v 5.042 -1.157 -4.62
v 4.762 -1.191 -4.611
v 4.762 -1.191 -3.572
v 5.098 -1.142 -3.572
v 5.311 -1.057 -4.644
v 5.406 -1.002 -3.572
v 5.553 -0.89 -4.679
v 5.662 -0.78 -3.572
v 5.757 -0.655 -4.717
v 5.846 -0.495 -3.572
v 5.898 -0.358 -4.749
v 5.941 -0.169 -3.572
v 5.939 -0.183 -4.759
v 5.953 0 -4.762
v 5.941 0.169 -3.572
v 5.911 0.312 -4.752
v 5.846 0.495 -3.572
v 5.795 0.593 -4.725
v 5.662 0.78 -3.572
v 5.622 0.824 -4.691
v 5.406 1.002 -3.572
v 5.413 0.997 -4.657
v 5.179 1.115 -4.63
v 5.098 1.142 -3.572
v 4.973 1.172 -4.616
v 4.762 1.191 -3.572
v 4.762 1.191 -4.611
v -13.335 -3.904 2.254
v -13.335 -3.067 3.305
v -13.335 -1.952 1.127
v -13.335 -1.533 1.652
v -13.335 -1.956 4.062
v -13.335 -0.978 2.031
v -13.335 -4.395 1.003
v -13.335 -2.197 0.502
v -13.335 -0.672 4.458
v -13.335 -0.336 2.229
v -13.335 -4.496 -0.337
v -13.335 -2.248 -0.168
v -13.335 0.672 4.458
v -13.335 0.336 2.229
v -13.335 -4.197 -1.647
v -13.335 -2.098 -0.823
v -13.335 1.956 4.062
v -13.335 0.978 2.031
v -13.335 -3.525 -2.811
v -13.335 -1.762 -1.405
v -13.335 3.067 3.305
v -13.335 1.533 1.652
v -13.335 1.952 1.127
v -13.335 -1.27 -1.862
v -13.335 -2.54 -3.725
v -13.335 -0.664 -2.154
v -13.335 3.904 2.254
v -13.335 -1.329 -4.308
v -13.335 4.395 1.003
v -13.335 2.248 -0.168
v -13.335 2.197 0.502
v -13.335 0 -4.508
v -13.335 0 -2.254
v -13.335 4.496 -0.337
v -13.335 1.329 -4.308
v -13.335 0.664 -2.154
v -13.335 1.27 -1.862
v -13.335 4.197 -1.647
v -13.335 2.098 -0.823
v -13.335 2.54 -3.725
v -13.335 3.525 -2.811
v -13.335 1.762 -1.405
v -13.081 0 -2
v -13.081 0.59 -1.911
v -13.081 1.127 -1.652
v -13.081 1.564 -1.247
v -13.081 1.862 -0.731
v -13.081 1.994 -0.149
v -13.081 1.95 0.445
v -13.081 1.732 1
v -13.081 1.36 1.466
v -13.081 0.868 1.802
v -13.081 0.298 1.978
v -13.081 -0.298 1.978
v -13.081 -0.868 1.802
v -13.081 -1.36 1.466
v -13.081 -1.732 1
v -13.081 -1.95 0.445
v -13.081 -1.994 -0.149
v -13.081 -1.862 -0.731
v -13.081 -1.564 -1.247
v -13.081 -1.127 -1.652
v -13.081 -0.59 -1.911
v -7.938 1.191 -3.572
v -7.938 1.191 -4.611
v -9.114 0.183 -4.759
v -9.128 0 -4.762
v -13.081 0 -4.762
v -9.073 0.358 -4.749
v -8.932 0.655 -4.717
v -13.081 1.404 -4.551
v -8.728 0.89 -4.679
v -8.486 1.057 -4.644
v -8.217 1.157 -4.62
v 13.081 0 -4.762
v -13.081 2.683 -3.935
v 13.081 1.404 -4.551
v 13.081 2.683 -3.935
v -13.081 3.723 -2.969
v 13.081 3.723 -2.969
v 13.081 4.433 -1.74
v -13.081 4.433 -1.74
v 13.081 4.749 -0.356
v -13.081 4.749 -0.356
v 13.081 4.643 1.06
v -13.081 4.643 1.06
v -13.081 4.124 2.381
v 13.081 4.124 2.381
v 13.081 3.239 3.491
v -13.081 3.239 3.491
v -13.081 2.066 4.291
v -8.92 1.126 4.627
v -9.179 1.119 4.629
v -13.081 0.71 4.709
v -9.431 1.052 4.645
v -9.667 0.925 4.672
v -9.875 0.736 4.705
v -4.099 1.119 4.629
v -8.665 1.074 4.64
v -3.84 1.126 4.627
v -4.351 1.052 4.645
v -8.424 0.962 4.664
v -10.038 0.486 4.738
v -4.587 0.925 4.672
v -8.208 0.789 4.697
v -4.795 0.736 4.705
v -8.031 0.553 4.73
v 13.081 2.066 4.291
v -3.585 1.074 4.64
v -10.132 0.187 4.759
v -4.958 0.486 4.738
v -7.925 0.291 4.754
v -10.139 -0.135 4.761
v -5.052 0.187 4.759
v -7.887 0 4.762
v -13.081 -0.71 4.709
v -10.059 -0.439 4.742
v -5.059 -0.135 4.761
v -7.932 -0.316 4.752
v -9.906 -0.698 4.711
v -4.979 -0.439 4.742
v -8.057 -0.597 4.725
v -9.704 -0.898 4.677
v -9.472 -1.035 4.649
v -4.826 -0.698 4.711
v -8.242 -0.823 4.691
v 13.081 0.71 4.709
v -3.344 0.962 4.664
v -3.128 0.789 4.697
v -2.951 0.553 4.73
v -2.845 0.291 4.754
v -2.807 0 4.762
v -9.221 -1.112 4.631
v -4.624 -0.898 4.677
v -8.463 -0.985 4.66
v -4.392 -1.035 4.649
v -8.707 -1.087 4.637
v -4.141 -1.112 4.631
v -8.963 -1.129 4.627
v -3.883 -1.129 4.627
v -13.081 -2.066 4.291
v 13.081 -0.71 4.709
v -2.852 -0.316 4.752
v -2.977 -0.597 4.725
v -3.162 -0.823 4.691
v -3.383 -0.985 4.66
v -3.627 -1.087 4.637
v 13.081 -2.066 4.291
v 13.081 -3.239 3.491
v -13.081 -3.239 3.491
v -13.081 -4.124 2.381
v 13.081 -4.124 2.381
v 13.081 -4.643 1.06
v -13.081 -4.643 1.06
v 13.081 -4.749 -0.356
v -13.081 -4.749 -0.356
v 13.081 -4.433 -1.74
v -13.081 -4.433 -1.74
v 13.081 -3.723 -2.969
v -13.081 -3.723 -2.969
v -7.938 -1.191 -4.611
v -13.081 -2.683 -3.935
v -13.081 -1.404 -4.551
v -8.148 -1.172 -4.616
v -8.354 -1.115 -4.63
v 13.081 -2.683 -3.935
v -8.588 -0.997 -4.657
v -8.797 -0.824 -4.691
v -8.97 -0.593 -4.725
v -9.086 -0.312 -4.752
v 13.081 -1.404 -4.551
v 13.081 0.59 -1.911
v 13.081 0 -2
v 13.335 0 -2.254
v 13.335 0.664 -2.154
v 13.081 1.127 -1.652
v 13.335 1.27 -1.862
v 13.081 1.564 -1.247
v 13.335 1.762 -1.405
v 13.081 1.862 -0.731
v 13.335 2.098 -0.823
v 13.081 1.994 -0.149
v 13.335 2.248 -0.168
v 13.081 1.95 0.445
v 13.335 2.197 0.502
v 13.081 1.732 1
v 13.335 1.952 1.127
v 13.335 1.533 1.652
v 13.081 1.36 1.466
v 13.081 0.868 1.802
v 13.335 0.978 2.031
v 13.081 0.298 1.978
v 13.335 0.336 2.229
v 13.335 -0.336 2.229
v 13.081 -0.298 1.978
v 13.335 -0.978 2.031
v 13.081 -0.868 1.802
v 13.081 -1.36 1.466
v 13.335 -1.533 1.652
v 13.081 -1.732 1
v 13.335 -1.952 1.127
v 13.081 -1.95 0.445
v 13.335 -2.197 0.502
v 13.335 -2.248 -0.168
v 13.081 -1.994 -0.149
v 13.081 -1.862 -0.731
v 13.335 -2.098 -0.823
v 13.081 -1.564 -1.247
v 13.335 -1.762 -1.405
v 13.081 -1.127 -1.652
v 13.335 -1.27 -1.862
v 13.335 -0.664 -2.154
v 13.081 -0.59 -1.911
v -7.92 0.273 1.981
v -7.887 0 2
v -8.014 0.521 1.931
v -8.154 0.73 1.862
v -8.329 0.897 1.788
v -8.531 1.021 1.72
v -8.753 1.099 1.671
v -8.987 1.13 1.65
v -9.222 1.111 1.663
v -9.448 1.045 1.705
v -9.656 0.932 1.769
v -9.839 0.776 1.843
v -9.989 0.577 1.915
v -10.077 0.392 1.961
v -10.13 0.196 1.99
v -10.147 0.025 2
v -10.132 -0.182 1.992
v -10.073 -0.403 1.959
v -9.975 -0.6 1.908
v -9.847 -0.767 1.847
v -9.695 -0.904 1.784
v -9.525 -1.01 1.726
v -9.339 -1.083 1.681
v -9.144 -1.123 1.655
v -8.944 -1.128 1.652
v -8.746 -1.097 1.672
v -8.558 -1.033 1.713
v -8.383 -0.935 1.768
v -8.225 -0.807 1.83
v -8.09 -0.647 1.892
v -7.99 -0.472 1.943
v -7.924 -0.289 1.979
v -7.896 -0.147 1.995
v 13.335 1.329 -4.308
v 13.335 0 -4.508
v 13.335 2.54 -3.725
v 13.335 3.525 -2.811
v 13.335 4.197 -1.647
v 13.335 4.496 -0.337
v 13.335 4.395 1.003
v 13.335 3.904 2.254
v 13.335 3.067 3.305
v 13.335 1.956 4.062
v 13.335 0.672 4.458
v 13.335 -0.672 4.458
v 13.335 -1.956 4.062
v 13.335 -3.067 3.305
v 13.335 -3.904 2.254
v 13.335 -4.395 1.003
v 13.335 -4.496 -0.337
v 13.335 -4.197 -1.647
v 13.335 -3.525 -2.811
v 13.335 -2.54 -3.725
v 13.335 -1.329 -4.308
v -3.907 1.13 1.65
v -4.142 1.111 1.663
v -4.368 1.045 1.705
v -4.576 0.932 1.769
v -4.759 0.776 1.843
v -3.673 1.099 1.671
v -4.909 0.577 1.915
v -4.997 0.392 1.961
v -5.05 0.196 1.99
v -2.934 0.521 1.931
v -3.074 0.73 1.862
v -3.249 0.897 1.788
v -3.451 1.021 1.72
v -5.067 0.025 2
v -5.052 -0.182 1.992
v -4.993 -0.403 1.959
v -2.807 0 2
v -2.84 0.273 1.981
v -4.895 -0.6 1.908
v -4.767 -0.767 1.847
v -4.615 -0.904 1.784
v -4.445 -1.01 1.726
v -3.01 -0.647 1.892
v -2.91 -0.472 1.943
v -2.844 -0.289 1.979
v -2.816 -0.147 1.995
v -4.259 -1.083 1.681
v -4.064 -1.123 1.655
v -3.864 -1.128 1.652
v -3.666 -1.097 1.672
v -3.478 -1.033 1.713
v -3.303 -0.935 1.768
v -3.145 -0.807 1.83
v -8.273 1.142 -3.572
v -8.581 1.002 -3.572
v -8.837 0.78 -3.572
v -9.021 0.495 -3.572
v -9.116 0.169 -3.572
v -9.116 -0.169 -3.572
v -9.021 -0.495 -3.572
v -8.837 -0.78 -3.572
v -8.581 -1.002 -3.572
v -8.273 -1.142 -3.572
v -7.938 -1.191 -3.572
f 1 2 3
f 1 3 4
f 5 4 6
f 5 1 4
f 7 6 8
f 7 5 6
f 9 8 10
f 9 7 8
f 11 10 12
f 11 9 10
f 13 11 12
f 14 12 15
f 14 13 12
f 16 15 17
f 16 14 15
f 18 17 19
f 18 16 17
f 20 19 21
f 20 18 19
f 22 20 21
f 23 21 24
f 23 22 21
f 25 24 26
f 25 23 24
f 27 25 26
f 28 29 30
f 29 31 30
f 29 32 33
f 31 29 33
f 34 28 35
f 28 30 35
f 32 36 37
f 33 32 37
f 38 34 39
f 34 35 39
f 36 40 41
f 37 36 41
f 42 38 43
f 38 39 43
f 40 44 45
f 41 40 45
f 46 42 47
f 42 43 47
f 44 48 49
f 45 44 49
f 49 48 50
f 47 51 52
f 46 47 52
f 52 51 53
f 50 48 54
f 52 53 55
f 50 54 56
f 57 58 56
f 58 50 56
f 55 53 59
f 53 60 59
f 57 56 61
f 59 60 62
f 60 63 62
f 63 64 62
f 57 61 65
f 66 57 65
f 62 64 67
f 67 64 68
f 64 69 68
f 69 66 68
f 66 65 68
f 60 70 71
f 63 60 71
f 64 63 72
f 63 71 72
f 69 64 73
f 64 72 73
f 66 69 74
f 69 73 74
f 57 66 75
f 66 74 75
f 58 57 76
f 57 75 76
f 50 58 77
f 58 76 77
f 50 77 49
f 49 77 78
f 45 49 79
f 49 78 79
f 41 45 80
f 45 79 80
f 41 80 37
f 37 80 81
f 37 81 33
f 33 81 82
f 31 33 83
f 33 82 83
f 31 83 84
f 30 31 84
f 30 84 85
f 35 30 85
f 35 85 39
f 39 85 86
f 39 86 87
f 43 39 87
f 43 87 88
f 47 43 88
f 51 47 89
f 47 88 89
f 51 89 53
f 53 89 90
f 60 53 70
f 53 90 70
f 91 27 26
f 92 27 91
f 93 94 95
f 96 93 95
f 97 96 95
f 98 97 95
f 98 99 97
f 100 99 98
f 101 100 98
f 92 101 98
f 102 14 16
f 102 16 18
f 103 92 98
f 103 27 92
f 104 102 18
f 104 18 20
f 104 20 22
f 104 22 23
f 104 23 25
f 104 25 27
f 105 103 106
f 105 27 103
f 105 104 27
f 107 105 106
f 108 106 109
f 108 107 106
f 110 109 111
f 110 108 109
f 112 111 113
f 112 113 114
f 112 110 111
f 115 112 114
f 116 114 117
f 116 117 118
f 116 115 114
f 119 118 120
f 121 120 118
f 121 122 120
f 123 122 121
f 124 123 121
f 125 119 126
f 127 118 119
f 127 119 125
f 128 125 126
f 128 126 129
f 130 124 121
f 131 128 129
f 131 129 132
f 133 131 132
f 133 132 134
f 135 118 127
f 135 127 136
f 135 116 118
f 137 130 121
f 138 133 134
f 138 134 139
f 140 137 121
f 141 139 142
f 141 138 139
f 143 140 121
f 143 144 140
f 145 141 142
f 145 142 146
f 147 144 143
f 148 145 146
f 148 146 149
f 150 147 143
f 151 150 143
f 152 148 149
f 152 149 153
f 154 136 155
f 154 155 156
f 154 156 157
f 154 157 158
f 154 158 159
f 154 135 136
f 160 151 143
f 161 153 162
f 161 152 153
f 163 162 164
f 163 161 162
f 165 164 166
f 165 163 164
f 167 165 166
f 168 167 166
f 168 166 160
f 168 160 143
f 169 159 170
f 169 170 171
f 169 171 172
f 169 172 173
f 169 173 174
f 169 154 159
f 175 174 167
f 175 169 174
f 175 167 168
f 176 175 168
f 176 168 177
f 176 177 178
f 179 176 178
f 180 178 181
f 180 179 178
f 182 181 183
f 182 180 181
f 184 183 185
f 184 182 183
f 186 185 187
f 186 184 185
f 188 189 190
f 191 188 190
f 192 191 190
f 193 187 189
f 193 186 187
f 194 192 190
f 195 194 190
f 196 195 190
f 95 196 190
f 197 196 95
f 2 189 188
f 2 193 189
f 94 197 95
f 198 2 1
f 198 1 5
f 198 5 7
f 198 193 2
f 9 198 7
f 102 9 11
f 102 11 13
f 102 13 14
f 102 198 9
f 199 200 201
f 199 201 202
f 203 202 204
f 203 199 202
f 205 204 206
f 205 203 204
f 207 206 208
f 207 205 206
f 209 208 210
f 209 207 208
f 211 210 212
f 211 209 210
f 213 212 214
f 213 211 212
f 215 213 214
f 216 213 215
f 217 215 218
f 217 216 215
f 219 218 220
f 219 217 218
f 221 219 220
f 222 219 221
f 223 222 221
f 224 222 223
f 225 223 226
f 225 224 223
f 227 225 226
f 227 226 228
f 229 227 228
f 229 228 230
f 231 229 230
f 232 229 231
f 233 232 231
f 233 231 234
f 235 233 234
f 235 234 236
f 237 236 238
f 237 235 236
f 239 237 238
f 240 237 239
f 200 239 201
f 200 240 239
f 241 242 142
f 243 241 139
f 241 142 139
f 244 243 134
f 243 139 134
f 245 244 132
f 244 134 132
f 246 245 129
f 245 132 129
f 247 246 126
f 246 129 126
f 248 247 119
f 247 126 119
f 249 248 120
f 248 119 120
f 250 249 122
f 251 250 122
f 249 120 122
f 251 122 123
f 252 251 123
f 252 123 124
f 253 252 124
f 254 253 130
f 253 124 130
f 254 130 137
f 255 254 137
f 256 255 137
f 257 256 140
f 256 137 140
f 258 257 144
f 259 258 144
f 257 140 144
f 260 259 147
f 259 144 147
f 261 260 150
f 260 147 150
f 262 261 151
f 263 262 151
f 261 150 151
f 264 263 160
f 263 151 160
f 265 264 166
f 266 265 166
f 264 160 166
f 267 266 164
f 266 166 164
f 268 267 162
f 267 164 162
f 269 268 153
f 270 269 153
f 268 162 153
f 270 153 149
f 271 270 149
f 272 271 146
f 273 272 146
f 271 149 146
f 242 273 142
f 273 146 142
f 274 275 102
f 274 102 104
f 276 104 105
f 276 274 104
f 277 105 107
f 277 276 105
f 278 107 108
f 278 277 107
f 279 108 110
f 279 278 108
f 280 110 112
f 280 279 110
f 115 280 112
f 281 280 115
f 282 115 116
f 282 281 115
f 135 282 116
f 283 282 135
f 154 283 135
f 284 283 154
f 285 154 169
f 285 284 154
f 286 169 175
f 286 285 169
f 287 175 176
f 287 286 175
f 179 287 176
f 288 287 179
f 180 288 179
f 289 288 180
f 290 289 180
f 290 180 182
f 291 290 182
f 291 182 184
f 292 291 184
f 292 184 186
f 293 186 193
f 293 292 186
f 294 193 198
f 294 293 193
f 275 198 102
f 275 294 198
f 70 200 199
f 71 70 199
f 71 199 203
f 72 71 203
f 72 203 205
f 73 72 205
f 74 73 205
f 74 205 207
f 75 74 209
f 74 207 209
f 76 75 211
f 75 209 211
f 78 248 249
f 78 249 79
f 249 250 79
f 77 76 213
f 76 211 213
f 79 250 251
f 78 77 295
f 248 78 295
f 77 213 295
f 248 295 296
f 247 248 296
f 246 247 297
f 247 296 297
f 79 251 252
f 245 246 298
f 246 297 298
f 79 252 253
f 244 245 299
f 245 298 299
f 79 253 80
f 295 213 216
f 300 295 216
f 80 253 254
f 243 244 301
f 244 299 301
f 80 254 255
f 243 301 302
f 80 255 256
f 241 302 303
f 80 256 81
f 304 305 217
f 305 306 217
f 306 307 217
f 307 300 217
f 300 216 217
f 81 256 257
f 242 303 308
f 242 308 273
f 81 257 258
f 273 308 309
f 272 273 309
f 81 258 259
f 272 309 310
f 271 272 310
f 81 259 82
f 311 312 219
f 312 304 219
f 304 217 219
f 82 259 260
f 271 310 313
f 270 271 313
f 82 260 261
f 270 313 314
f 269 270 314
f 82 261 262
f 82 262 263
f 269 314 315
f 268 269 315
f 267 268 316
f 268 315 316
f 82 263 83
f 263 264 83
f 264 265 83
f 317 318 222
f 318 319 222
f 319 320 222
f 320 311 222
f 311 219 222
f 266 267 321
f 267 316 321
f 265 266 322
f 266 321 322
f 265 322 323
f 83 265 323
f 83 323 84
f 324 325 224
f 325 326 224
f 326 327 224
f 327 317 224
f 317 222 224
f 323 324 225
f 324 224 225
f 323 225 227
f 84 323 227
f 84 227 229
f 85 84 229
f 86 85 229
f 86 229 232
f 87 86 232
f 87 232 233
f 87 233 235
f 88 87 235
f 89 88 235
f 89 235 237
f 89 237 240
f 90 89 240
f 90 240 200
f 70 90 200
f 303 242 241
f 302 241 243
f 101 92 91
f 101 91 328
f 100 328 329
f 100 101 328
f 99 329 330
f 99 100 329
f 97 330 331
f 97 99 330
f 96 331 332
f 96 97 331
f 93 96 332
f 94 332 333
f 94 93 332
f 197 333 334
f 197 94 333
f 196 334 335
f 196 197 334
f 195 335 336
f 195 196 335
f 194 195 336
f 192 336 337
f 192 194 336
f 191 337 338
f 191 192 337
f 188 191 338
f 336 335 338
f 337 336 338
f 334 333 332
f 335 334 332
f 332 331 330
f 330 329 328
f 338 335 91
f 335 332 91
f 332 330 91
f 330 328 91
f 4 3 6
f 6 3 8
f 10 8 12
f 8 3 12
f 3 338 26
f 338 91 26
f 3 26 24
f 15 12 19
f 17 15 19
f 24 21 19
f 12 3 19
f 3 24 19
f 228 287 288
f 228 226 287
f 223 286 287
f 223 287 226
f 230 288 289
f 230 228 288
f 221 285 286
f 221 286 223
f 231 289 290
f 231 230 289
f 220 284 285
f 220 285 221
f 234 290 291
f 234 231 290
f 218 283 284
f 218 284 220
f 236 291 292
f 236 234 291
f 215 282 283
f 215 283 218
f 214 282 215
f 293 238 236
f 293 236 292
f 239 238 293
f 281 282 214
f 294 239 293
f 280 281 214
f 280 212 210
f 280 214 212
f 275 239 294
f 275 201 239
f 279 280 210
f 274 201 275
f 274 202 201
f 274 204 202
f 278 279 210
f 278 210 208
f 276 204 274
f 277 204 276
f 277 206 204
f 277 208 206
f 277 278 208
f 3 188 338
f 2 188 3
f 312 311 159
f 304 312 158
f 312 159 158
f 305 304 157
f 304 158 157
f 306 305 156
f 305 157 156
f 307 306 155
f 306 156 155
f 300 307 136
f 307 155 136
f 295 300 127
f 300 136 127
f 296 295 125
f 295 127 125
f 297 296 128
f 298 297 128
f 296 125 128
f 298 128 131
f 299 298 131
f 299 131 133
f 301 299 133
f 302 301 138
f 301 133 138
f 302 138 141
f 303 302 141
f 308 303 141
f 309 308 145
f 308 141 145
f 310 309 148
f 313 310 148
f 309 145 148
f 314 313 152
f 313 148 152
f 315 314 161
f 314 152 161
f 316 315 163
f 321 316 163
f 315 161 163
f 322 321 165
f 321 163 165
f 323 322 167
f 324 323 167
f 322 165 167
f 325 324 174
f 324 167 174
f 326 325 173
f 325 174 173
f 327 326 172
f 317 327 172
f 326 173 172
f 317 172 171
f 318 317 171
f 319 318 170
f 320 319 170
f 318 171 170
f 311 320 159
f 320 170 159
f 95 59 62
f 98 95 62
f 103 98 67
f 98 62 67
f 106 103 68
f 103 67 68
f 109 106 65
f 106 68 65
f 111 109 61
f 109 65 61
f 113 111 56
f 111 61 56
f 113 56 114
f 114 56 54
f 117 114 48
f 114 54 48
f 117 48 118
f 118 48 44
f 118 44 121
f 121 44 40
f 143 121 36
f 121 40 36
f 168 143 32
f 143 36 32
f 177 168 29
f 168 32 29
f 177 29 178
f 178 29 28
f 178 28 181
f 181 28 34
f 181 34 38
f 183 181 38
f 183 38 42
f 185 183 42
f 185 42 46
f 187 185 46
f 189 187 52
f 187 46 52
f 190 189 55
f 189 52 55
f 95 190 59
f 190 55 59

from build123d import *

# Parameters (mm, degrees)
SKETCH1_R                  = 4.7625
BOSS_EXTRUDE1_DEPTH        = 13.335
SKETCH2_R                  = 2
CUT_EXTRUDE1_DEPTH         = 28.507302894
F_4_40_TAPPED_HOLE1_REACH  = 19.065
F_4_40_TAPPED_HOLE1_BORE_R = 1.1303
CUT_EXTRUDE2_DEPTH         = 1.190625
CHAMFER1_SIZE              = 0.254


with BuildPart() as part:
    # Sketch1 → Boss-Extrude1 (new, symmetric)
    with BuildSketch(Plane(origin=(0, 0, 0), x_dir=(0, 0, -1), z_dir=(1, 0, 0))):
        Circle(SKETCH1_R)
    extrude(amount=BOSS_EXTRUDE1_DEPTH, both=True)

    # Sketch2 → Cut-Extrude1 (cut, through all)
    with BuildSketch(Plane(origin=(13.335, 0, 0), x_dir=(0, 0, -1), z_dir=(1, 0, 0))):
        Circle(SKETCH2_R)
    extrude(amount=-CUT_EXTRUDE1_DEPTH, mode=Mode.SUBTRACT)

    # #4-40 Tapped Hole1 bore → #4-40 Tapped Hole1 (cut, up to next)
    with BuildSketch(Plane.XY.offset(4.7625), mode=Mode.PRIVATE) as f_4_40_tapped_hole1_sk1:
        with Locations((-9.017, 0)):
            Circle(F_4_40_TAPPED_HOLE1_BORE_R)
    f_4_40_tapped_hole1_tool1 = extrude(f_4_40_tapped_hole1_sk1.sketch, amount=-F_4_40_TAPPED_HOLE1_REACH, mode=Mode.PRIVATE) & part.part
    # #4-40 Tapped Hole1 bore → #4-40 Tapped Hole1 (cut, up to next)
    with BuildSketch(Plane.XY.offset(4.7625), mode=Mode.PRIVATE) as f_4_40_tapped_hole1_sk2:
        with Locations((-3.937, 0)):
            Circle(F_4_40_TAPPED_HOLE1_BORE_R)
    f_4_40_tapped_hole1_tool2 = extrude(f_4_40_tapped_hole1_sk2.sketch, amount=-F_4_40_TAPPED_HOLE1_REACH, mode=Mode.PRIVATE) & part.part
    add(f_4_40_tapped_hole1_tool1.solids().sort_by_distance((-9.017, 0, 4.7625))[0], mode=Mode.SUBTRACT)
    add(f_4_40_tapped_hole1_tool2.solids().sort_by_distance((-3.937, 0, 4.7625))[0], mode=Mode.SUBTRACT)

    # Sketch7 → Cut-Extrude2 (cut)
    with BuildSketch(Plane(origin=(0, 0, -4.7625), x_dir=(-1, 0, 0), z_dir=(0, 0, -1))):
        with BuildLine():
            Line((-4.7625, 1.190625), (7.9375, 1.190625))
            ThreePointArc((7.9375, 1.190625), (9.128125, 0), (7.9375, -1.190625))
            Line((7.9375, -1.190625), (-4.7625, -1.190625))
            ThreePointArc((-4.7625, -1.190625), (-5.953125, 0), (-4.7625, 1.190625))
        make_face()
    extrude(amount=-CUT_EXTRUDE2_DEPTH, mode=Mode.SUBTRACT)

    # Chamfer1
    chamfer1_edges = [part.edges().sort_by_distance(p)[0] for p in [
        (-13.335, 0, 4.7625),
        (13.335, 0, 4.7625),
        (-13.335, 0, 2),
        (13.335, 0, 2),
    ]]
    chamfer(chamfer1_edges, length=CHAMFER1_SIZE)


solid = part.part
